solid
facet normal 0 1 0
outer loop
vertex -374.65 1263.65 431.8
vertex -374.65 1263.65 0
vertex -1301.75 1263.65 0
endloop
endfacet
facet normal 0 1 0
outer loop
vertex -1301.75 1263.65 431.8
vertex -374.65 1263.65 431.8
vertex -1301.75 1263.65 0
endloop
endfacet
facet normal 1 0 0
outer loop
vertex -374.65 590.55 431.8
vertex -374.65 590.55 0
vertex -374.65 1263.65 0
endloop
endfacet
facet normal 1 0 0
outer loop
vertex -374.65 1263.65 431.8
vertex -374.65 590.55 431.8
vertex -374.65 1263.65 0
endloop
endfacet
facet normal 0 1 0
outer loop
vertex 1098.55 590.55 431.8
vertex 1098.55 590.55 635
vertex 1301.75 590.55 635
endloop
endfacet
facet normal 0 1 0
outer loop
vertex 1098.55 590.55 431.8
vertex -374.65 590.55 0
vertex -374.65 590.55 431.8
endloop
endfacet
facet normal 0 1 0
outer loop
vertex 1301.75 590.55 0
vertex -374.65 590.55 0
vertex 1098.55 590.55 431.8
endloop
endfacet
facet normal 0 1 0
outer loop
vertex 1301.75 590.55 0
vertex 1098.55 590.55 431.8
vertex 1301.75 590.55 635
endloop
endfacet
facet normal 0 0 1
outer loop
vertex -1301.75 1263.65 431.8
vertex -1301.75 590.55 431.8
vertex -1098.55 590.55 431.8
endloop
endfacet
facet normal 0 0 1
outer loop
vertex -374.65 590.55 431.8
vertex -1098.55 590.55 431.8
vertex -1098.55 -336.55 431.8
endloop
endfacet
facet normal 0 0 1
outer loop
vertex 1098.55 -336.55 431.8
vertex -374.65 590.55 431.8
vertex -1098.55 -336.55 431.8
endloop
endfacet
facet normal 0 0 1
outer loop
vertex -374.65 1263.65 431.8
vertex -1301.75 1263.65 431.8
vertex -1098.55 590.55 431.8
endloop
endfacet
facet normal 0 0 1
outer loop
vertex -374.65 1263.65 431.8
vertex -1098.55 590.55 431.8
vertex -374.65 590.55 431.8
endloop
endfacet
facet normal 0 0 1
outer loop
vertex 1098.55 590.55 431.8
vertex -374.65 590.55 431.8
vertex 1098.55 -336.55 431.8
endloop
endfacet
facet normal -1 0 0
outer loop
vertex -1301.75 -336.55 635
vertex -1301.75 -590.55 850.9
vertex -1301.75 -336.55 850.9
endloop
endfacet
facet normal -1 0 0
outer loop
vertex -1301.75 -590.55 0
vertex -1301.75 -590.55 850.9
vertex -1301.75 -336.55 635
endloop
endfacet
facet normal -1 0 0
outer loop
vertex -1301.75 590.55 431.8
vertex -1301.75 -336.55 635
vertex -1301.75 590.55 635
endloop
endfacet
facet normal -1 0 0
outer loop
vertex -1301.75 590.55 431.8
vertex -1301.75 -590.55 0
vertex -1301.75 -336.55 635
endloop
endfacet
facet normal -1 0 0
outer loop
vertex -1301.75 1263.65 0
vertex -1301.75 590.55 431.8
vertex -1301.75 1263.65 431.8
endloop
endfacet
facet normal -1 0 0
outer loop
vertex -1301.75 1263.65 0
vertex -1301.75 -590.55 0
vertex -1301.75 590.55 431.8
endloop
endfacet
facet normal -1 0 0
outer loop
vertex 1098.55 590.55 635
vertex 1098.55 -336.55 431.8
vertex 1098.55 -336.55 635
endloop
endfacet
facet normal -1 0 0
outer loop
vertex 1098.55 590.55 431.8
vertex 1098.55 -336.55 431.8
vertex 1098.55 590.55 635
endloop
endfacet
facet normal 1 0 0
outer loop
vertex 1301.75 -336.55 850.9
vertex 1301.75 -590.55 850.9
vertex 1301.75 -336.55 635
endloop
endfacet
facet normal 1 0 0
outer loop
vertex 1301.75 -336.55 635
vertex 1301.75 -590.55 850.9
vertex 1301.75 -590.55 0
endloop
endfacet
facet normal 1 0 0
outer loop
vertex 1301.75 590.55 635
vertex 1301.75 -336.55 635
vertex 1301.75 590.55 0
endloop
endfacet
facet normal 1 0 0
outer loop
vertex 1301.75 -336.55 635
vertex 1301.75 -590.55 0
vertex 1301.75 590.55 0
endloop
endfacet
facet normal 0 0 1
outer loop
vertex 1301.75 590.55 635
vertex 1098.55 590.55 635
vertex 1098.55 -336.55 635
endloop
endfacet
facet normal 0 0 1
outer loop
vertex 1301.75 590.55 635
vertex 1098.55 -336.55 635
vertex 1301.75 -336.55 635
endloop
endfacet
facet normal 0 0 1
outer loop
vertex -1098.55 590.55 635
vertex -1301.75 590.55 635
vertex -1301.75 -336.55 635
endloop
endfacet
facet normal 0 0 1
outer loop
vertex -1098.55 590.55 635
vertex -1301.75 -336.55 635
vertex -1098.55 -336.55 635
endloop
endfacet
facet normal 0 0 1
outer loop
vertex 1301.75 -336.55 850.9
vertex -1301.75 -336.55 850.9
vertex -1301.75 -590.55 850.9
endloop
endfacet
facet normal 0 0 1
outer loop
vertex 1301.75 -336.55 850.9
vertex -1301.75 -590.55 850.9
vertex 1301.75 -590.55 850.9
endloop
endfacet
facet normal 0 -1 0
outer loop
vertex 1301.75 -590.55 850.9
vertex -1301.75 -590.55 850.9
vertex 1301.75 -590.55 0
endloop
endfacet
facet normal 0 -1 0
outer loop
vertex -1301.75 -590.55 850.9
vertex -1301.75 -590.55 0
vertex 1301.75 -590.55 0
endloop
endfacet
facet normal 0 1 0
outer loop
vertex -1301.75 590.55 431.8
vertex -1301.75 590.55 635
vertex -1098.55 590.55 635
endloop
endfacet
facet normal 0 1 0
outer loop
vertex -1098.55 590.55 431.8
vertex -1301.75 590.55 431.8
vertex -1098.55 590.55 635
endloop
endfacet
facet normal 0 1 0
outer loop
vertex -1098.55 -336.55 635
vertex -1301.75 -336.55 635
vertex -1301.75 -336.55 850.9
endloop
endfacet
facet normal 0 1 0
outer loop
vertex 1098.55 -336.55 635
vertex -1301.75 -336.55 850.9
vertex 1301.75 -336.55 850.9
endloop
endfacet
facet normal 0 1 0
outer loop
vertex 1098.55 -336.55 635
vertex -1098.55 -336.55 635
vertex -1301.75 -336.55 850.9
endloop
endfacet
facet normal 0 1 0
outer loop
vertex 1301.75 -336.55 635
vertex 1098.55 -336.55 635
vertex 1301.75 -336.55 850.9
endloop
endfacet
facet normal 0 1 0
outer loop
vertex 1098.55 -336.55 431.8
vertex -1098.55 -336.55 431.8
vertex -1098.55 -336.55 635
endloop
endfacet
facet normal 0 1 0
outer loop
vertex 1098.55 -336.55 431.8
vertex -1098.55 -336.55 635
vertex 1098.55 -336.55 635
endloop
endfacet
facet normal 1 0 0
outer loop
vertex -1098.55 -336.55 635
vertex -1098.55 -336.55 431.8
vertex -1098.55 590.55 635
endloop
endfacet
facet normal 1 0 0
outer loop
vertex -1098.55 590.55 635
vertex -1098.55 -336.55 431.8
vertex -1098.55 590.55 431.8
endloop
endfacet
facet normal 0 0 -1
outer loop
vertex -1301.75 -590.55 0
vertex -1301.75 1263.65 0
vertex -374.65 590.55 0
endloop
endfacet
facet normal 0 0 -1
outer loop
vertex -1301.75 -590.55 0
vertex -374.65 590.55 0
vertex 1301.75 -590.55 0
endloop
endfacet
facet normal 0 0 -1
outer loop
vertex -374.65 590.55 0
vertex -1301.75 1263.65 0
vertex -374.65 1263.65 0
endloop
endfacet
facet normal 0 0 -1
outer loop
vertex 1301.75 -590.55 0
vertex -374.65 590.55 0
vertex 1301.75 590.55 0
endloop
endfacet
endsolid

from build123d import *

# Parameters (mm, degrees)
F1_DEPTH = 431.8
F2_W     = 2603.5
F2_H     = 254
F3_DEPTH = 419.1
F4_W     = 203.2
F4_H     = 927.1
F5_DEPTH = 203.2


with BuildPart() as f1:
    # F0 (on Top) → F1 (new body)
    with BuildSketch(Plane.XY):
        Polygon((-374.65, 1263.65), (-1301.75, 1263.65), (-1301.75, -590.55), (1301.75, -590.55), (1301.75, 590.55), (-374.65, 590.55), align=None)
    extrude(amount=F1_DEPTH)

    # F2 (on face) → F3 (join)
    with BuildSketch(Plane.XY.offset(431.8)):
        with Locations((0, -463.55)):
            Rectangle(F2_W, F2_H)
    extrude(amount=F3_DEPTH)

    # F4 (on face) → F5 (join)
    with BuildSketch(Plane.XY.offset(431.8)):
        with Locations((1200.15, 127)):
            Rectangle(F4_W, F4_H)
        with Locations((-1200.15, 127)):
            Rectangle(F4_W, F4_H)
    extrude(amount=F5_DEPTH)


solid = f1.part
